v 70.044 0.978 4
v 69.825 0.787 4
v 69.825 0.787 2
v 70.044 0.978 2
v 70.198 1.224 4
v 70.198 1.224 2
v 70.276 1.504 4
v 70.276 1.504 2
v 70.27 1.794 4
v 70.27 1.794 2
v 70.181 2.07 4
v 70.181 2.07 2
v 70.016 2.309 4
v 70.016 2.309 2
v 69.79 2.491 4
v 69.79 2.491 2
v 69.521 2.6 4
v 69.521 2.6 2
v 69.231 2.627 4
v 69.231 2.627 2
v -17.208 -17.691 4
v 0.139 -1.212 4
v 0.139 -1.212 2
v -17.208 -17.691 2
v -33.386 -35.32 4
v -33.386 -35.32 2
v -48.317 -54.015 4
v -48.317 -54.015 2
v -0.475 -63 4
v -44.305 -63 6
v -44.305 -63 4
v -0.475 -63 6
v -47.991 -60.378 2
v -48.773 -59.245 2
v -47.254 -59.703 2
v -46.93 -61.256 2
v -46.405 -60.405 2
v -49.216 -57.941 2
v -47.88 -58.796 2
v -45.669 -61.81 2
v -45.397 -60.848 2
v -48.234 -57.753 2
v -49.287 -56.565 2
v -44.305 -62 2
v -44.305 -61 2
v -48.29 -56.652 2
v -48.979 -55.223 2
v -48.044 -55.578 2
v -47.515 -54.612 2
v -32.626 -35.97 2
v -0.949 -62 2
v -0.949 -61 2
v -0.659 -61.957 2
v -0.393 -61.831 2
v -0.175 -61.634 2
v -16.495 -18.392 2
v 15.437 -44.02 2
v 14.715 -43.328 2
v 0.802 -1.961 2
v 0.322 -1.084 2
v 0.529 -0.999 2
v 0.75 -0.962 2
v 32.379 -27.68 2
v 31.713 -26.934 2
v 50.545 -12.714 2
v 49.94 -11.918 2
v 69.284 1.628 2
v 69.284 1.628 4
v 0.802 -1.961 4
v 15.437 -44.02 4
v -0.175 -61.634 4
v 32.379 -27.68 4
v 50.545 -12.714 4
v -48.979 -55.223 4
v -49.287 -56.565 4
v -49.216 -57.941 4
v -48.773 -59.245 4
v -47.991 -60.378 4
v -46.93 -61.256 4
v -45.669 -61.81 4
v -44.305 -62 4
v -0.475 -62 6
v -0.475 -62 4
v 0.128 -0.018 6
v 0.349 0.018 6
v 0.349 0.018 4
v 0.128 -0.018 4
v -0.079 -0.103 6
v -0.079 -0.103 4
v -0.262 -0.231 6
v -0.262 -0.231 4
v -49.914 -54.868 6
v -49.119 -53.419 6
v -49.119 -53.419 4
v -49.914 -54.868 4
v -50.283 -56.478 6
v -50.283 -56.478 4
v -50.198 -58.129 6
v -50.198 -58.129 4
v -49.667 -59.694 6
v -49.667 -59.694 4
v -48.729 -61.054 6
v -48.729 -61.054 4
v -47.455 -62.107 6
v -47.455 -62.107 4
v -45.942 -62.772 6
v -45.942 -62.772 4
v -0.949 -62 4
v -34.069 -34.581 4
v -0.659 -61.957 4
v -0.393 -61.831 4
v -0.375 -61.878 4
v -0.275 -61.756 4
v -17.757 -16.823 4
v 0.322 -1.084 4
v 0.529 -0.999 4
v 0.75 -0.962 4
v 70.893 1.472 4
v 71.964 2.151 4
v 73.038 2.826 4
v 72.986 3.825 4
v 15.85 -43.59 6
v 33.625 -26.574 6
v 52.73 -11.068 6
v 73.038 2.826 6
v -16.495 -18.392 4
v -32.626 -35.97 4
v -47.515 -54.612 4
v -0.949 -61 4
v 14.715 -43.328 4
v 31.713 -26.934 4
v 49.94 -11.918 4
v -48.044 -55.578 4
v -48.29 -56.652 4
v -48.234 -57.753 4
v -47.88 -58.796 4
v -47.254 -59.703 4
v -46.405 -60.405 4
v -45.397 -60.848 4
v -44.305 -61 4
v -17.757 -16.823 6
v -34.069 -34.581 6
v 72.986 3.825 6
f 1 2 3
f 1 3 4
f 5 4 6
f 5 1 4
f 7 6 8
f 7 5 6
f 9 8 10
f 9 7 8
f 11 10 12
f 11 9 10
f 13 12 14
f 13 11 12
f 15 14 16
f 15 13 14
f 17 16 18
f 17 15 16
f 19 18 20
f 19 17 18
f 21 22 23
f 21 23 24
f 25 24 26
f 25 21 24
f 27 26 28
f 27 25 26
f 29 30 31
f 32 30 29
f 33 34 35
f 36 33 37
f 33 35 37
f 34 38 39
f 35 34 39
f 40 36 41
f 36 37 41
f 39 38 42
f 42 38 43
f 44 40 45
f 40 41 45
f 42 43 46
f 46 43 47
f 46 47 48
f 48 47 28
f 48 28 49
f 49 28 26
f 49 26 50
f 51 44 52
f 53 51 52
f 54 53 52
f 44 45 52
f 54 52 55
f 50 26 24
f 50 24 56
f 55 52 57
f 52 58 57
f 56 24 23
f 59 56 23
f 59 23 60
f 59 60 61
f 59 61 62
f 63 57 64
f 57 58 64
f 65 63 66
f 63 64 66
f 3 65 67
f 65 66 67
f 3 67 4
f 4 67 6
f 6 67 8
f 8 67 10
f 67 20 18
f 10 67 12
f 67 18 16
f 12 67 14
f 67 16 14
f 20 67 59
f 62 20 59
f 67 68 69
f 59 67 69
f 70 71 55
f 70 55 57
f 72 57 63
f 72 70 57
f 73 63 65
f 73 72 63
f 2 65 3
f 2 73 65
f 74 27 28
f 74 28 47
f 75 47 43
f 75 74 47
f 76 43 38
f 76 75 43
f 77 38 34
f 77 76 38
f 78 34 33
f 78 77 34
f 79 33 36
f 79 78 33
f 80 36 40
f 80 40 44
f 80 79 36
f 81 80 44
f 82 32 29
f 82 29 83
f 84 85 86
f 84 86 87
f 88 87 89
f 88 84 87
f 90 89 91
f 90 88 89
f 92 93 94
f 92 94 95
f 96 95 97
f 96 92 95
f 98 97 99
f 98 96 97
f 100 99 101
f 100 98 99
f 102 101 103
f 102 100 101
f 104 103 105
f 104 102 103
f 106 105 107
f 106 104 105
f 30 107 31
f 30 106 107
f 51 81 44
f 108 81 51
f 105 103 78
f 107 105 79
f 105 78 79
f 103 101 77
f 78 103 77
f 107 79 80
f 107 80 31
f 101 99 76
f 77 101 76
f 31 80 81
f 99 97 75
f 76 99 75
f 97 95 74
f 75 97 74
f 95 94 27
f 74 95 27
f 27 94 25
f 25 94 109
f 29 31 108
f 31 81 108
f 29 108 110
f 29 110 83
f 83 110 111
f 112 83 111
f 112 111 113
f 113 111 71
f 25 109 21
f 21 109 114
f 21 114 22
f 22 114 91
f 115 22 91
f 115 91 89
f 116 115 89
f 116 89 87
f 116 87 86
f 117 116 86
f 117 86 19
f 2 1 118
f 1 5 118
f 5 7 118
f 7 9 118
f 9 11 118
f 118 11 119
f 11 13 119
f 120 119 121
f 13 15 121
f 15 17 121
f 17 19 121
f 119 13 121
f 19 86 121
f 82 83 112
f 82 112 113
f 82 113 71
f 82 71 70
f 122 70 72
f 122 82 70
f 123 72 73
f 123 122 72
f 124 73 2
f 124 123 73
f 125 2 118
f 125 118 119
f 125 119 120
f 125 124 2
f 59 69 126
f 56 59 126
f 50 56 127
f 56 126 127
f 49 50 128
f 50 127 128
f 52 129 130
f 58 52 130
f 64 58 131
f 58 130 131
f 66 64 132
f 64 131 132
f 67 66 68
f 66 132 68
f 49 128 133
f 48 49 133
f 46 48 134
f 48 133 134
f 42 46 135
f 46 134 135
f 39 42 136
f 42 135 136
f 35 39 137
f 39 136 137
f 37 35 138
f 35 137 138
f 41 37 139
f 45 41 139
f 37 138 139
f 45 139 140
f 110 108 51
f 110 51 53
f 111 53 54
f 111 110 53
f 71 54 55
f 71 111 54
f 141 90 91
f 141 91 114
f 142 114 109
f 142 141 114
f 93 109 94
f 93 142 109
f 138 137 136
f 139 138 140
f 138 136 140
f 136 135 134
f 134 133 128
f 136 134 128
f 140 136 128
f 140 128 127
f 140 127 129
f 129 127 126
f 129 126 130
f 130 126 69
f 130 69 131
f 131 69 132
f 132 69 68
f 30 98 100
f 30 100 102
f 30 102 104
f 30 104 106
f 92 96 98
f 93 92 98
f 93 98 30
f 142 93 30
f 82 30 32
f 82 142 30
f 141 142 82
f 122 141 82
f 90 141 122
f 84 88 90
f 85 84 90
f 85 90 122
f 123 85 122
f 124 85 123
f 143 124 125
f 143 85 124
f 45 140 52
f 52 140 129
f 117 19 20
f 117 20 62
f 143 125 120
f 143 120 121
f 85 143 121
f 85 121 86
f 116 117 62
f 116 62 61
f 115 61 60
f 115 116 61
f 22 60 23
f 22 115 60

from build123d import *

# Parameters (mm, degrees)
BOSS_EXTRUDE1_DEPTH = 2
BOSS_EXTRUDE2_START = 2
BOSS_EXTRUDE2_DEPTH = 2


with BuildPart() as part:
    # Sketch2 → Boss-Extrude1 (new body)
    with BuildSketch(Plane.XY.offset(4)):
        with BuildLine():
            Line((-44.305483114, -62), (-0.949182939, -62))
            ThreePointArc((-0.949182939, -62), (-0.521138453, -61.903757665), (-0.175485968, -61.633555836))
            ThreePointArc((-0.175485968, -61.633555836), (32.378563383, -27.679914383), (69.824948938, 0.787331812))
            ThreePointArc((69.824948938, 0.787331812), (70.23551024, 1.935299571), (69.231475595, 2.626895546))
            Line((69.231475595, 2.626895546), (0.749958934, -0.962068664))
            ThreePointArc((0.749958934, -0.962068664), (0.423121019, -1.035372755), (0.13882509, -1.212495134))
            ThreePointArc((0.13882509, -1.212495134), (-25.448078904, -26.366894393), (-48.317042245, -54.015474353))
            ThreePointArc((-48.317042245, -54.015474353), (-48.773291762, -59.244701736), (-44.305483114, -62))
        make_face()
        with BuildLine():
            Line((69.283811551, 1.628266012), (0.80229489, -1.960698198))
            ThreePointArc((0.80229489, -1.960698198), (-24.711294193, -27.043021815), (-47.514730419, -54.612379482))
            ThreePointArc((-47.514730419, -54.612379482), (-47.879730032, -58.795761389), (-44.305483114, -61))
            Line((-44.305483114, -61), (-0.949182939, -61))
            ThreePointArc((-0.949182939, -61), (31.7130194, -26.933555752), (69.283811551, 1.628266012))
        make_face(mode=Mode.SUBTRACT)
    extrude(amount=-BOSS_EXTRUDE1_DEPTH)

    # Sketch3 → Boss-Extrude2 (add)
    with BuildSketch(Plane.XY.offset(4).offset(BOSS_EXTRUDE2_START)):
        with BuildLine():
            Line((73.03813327, 2.826394022), (72.985797314, 3.825023556))
            Line((72.985797314, 3.825023556), (0.348531139, 0.018265743))
            ThreePointArc((0.348531139, 0.018265743), (0.022157357, -0.054848295), (-0.261851868, -0.231495595))
            ThreePointArc((-0.261851868, -0.231495595), (-26.066145165, -25.561463063), (-49.119354071, -53.418569223))
            ThreePointArc((-49.119354071, -53.418569223), (-49.666853492, -59.693642083), (-44.305483114, -63))
            Line((-44.305483114, -63), (-0.475074433, -63))
            Line((-0.475074433, -63), (-0.475074433, -62))
            ThreePointArc((-0.475074433, -62), (33.625159473, -26.574476321), (73.03813327, 2.826394022))
        make_face()
    extrude(amount=-BOSS_EXTRUDE2_DEPTH)


solid = part.part
